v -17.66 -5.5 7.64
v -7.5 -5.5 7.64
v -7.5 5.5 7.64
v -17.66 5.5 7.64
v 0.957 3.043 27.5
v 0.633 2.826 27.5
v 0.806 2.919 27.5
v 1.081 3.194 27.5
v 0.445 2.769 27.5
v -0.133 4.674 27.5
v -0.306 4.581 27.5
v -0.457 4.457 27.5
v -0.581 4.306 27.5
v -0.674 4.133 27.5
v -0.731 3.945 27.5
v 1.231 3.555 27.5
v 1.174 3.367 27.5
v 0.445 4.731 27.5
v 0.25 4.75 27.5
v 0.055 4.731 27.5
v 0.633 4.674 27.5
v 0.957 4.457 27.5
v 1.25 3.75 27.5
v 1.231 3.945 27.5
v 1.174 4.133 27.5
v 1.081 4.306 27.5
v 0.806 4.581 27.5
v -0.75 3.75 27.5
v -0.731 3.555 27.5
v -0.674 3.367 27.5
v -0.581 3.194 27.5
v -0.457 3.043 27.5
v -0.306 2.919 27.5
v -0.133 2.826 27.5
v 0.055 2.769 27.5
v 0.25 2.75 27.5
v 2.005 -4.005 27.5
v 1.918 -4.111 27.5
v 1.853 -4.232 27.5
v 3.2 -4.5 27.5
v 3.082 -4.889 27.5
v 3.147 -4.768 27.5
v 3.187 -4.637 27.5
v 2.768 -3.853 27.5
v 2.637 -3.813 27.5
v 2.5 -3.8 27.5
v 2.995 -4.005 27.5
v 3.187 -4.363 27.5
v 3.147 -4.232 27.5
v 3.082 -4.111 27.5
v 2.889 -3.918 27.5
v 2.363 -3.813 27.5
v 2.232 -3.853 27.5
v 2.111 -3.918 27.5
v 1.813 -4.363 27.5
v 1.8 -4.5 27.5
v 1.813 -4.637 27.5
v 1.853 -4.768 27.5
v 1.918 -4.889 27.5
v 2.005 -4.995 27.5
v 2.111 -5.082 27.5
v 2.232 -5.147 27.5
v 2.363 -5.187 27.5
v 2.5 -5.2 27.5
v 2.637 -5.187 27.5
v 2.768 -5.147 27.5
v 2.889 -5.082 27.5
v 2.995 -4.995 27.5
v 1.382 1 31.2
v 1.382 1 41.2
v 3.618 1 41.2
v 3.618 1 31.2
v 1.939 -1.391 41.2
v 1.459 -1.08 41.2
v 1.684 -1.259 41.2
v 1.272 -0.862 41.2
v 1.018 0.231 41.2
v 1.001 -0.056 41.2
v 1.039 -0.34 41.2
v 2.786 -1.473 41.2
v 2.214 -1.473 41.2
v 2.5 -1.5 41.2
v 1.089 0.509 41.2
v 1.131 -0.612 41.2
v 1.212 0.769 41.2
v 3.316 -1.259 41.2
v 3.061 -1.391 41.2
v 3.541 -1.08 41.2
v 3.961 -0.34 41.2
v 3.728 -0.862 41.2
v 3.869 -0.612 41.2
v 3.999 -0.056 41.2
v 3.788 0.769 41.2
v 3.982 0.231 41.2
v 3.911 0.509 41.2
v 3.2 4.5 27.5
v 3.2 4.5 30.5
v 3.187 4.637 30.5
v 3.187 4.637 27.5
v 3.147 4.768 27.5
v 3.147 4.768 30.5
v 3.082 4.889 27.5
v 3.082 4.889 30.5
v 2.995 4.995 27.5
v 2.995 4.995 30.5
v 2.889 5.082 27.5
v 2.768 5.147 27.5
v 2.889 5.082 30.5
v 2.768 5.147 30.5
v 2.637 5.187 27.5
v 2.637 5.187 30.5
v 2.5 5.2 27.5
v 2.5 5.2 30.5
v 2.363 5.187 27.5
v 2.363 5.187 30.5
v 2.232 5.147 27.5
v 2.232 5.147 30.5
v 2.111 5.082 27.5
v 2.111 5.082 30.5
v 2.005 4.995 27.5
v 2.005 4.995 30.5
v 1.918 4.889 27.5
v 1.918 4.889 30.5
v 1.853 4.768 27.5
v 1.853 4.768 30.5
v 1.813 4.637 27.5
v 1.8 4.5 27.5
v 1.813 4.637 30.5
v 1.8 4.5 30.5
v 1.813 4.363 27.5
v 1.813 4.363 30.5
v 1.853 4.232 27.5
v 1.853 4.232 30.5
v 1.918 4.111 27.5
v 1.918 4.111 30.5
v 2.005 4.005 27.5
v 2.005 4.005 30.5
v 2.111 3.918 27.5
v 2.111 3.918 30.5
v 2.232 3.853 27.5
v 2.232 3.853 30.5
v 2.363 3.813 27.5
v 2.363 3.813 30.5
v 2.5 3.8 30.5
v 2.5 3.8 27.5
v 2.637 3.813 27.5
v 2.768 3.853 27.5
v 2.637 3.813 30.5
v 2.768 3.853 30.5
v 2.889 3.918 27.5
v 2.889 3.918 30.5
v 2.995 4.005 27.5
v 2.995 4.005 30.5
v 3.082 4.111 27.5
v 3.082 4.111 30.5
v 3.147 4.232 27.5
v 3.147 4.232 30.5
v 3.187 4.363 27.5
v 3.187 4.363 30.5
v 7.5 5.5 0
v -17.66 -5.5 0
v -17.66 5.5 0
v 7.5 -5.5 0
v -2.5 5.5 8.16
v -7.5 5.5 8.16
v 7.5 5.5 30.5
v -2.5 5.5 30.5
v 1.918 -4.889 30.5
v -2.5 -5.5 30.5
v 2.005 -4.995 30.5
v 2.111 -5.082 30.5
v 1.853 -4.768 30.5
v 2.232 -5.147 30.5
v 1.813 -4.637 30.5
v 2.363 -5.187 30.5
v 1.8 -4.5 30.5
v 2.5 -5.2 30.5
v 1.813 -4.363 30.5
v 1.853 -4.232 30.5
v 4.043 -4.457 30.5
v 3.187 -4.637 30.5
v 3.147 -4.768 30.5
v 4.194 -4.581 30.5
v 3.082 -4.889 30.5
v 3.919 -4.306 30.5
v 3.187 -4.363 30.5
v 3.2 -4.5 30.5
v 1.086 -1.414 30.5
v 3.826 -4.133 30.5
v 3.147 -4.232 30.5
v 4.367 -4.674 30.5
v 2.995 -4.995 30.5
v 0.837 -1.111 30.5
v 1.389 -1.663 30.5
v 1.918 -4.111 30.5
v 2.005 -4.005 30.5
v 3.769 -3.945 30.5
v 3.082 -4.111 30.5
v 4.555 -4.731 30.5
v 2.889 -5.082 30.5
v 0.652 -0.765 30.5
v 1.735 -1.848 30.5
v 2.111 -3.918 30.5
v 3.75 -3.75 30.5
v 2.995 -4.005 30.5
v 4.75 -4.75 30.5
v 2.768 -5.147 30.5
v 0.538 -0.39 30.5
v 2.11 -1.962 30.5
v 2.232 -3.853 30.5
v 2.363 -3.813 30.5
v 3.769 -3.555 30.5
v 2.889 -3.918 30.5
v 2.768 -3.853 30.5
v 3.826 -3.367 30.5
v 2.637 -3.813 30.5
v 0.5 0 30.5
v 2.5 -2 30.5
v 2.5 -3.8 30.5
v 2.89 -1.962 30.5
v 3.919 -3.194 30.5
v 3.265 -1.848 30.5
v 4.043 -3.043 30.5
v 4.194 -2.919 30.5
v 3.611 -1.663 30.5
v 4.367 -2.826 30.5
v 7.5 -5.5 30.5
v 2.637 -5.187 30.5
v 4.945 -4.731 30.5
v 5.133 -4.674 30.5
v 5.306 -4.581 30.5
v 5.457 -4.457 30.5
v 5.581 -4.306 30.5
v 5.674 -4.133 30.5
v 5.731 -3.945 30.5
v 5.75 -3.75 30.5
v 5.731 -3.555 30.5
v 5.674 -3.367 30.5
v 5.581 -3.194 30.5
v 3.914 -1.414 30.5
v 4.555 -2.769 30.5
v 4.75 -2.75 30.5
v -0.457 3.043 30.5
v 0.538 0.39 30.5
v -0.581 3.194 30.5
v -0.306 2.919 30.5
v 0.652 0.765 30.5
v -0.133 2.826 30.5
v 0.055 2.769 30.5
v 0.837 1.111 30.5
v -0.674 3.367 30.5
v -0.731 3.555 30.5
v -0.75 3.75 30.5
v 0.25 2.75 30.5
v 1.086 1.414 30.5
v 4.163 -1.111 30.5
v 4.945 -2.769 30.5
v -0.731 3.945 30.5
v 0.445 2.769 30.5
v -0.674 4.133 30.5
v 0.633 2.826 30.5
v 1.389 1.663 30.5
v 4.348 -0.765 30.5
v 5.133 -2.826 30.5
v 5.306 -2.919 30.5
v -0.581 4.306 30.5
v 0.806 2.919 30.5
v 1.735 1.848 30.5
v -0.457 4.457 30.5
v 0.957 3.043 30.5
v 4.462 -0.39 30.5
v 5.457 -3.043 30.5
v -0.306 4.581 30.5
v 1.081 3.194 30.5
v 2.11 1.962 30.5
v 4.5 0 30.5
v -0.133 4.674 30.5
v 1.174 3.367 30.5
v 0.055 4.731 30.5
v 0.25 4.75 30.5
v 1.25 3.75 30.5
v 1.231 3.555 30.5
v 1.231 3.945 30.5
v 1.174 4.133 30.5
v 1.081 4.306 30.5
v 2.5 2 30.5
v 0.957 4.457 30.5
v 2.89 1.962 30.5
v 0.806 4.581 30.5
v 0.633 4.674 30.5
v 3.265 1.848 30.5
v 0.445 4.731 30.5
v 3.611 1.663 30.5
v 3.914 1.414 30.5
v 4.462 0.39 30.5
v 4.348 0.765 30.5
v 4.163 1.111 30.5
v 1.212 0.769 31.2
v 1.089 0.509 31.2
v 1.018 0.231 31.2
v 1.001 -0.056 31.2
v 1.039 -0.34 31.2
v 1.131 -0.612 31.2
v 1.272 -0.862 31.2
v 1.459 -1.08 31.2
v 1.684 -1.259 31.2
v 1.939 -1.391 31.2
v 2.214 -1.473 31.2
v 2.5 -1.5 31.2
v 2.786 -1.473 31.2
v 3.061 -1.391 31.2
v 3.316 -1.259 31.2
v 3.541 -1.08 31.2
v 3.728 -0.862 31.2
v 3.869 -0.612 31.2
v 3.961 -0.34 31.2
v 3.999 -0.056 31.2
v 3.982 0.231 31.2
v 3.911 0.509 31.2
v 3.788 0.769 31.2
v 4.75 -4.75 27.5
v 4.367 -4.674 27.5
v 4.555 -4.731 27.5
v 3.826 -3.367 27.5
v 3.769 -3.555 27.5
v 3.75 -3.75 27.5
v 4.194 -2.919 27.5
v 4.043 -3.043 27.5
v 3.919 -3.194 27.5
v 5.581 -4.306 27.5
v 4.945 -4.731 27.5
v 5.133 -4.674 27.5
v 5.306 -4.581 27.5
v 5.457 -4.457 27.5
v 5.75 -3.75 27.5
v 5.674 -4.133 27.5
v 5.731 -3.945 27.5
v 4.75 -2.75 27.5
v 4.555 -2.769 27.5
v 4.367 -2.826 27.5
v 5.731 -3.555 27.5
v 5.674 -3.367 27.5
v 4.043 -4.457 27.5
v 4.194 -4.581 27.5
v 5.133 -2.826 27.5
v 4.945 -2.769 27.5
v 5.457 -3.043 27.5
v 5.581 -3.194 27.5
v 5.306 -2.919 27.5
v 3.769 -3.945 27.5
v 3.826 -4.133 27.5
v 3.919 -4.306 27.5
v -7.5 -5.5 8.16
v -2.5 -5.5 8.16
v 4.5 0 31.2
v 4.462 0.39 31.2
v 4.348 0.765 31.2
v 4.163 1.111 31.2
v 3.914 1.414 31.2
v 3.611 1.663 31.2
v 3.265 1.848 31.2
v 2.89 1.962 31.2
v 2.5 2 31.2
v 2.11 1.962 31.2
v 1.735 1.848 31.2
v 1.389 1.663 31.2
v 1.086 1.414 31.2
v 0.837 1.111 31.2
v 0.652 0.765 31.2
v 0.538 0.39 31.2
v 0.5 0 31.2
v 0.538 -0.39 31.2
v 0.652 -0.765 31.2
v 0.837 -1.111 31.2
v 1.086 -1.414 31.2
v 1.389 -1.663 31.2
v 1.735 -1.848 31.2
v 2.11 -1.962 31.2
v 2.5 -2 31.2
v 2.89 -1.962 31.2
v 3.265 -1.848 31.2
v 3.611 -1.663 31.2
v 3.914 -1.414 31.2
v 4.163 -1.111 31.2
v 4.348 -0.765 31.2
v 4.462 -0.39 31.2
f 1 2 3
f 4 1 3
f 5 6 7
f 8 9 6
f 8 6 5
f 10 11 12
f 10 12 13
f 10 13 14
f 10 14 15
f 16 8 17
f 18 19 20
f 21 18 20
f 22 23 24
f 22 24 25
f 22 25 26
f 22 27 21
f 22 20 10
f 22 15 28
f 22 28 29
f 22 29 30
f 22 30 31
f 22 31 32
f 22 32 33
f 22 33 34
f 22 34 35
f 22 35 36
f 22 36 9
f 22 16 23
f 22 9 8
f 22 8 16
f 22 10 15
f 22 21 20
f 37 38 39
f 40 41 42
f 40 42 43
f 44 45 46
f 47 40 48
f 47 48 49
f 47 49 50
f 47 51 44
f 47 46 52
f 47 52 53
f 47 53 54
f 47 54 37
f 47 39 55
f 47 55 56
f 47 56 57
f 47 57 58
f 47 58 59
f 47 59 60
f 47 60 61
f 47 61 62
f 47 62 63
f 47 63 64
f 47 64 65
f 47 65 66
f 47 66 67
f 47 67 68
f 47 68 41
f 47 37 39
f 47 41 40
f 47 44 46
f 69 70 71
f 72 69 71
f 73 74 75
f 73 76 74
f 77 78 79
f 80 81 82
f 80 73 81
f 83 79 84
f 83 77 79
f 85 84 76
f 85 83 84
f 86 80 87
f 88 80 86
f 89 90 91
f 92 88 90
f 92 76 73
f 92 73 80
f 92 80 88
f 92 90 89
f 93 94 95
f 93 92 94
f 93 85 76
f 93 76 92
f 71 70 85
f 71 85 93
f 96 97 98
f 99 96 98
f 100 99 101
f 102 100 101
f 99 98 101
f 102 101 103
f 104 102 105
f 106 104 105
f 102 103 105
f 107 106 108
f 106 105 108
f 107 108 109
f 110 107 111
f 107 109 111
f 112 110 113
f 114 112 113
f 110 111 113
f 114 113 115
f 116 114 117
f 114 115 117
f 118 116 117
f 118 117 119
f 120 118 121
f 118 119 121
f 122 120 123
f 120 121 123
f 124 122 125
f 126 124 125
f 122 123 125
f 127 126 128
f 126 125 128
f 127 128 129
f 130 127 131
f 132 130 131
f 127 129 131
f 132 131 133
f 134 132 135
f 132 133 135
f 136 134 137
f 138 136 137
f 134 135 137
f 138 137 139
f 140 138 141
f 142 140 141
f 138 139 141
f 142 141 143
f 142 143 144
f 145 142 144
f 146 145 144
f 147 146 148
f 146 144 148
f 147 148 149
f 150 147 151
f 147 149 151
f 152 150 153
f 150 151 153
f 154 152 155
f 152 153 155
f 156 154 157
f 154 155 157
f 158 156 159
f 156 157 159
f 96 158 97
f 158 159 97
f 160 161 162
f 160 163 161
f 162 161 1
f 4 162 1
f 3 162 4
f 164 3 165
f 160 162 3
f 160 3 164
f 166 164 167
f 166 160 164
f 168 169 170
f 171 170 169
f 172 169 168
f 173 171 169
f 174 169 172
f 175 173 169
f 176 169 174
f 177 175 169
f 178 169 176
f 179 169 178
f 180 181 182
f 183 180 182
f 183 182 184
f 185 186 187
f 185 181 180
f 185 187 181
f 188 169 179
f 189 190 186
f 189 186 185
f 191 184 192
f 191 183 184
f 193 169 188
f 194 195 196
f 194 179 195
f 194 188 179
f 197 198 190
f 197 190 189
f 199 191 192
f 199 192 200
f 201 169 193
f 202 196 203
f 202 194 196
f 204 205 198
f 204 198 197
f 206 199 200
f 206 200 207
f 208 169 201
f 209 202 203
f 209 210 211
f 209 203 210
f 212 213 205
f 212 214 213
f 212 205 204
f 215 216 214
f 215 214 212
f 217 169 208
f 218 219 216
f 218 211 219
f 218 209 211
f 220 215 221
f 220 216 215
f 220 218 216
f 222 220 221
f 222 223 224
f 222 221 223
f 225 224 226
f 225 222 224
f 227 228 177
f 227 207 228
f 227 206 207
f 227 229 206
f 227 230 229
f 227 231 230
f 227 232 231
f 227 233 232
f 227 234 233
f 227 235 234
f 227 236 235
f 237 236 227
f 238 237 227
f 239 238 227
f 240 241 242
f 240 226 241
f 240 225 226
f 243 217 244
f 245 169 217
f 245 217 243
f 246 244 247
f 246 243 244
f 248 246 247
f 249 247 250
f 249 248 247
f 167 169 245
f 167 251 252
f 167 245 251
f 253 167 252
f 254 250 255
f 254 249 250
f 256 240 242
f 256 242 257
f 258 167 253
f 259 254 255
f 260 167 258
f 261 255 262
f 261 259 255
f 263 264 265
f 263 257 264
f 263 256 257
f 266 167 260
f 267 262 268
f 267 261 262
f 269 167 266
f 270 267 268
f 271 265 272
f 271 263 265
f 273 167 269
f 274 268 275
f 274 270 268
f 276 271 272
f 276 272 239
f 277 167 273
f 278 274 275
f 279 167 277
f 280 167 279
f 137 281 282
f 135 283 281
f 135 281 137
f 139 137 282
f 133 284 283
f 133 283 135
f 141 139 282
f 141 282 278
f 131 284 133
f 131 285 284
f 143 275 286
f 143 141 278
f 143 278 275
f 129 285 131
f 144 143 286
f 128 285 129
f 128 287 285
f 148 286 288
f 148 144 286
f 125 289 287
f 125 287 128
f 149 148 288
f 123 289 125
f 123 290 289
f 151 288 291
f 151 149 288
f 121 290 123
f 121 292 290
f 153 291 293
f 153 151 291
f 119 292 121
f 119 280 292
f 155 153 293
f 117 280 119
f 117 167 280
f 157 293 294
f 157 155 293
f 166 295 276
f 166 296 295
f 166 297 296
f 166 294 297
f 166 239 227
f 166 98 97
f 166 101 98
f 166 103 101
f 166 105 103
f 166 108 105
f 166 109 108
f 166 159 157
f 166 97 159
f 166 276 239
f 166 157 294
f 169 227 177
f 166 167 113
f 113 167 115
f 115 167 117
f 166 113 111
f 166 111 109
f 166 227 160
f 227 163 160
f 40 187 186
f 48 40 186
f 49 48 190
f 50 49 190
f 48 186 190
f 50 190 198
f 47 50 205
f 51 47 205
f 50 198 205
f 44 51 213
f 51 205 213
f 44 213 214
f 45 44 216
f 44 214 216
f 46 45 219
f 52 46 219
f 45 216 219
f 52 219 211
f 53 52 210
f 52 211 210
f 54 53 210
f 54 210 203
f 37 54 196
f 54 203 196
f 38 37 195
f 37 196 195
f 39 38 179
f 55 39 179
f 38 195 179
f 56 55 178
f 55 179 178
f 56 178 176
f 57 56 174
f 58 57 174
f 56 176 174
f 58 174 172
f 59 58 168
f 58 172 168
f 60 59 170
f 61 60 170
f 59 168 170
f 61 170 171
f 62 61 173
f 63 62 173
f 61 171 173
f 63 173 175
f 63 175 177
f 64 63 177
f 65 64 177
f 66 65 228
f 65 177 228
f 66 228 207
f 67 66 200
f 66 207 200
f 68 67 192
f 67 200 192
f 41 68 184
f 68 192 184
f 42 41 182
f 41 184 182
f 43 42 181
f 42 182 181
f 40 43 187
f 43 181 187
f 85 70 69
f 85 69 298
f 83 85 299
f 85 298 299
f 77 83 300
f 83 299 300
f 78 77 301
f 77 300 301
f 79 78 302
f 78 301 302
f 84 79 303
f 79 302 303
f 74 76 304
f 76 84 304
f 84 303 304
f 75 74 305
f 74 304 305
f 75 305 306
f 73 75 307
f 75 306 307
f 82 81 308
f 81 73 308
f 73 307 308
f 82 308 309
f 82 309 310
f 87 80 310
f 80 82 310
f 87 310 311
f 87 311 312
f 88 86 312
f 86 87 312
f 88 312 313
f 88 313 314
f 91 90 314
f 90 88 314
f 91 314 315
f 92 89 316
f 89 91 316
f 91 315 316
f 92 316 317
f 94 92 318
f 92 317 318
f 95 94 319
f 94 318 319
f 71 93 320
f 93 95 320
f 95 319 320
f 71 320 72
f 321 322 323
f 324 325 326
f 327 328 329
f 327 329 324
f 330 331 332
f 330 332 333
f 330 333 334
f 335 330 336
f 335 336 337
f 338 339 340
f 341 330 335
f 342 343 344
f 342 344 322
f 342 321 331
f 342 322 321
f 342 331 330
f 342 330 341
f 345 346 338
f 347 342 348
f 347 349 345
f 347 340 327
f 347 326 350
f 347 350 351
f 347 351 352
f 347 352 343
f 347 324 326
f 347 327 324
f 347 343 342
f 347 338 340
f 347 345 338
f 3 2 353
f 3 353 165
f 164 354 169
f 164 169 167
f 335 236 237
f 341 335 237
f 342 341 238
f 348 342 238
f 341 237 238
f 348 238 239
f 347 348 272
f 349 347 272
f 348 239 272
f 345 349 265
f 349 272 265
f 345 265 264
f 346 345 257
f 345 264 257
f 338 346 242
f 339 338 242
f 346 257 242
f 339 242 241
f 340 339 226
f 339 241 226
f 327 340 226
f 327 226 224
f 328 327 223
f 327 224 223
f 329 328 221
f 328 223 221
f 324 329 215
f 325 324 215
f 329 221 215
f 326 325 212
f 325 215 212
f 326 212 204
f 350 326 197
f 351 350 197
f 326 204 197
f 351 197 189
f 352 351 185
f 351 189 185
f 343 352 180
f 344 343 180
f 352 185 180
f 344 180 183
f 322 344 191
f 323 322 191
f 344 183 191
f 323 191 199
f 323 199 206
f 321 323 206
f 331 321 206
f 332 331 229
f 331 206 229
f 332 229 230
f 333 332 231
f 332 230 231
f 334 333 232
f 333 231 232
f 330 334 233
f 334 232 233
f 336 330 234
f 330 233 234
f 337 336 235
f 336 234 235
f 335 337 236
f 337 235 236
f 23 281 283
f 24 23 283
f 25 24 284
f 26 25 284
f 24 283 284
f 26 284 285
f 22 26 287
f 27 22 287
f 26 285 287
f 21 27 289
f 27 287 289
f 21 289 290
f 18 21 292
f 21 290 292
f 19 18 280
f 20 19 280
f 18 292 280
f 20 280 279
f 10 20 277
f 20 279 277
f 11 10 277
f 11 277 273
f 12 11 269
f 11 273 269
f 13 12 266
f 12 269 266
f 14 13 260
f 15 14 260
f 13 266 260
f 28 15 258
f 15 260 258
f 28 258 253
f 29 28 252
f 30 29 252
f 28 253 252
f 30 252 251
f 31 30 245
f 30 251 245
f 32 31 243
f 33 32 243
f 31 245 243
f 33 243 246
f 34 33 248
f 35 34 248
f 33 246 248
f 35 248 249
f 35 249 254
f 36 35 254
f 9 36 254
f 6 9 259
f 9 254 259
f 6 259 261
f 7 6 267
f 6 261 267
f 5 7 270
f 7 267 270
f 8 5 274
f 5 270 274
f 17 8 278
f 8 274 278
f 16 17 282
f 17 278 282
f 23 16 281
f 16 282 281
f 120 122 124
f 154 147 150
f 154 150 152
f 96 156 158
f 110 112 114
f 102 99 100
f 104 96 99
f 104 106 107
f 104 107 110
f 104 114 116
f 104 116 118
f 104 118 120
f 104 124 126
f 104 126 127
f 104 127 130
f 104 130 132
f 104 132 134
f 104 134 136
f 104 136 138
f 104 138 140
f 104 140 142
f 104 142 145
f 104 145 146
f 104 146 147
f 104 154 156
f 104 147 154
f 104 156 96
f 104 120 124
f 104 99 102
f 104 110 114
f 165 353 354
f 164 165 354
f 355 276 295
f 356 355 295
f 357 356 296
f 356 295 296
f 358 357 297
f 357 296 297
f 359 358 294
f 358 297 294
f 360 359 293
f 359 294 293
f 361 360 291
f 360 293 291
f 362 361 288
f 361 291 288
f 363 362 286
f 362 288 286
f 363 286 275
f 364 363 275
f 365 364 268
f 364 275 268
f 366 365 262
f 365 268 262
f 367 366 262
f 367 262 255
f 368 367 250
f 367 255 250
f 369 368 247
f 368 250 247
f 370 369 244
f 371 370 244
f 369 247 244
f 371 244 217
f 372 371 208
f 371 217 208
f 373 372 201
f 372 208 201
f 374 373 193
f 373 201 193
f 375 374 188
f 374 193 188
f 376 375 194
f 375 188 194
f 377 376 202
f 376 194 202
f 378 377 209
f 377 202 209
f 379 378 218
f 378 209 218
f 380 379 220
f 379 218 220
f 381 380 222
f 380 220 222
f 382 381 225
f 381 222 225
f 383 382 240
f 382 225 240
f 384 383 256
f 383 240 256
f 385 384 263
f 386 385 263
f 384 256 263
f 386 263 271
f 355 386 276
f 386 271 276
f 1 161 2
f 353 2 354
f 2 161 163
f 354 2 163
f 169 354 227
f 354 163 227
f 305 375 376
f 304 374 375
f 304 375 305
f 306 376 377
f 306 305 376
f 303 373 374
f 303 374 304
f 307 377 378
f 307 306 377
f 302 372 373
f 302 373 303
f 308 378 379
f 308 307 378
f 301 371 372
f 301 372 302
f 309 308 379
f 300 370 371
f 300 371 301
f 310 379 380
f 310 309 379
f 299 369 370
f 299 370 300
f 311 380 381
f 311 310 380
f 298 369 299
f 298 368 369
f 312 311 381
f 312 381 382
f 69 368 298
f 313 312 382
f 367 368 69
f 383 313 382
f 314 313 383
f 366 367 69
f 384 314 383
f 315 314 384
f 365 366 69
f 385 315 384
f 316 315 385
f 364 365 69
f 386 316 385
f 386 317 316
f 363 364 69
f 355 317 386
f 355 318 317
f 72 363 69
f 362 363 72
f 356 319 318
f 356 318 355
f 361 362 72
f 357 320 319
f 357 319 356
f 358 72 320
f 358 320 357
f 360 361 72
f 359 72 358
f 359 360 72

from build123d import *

# Parameters (mm, degrees)
SKETCH1_W           = 15
SKETCH1_H           = 11
BOSS_EXTRUDE1_DEPTH = 21.5
SKETCH2_W           = 10
SKETCH2_H           = 11
BOSS_EXTRUDE2_DEPTH = 9
SKETCH3_R           = 2
BOSS_EXTRUDE3_DEPTH = 0.7
SKETCH4_R           = 1.5
BOSS_EXTRUDE4_DEPTH = 10
CUT_EXTRUDE1_DEPTH  = 10
SKETCH6_R           = 0.7
SKETCH6_R_2         = 1
CUT_EXTRUDE2_DEPTH  = 3
SKETCH7_W           = 7.64
SKETCH7_H           = 11
BOSS_EXTRUDE5_DEPTH = 10.16
SKETCH8_W           = 5
SKETCH8_H           = 13.3399974
CUT_EXTRUDE3_DEPTH  = 11


with BuildPart() as part:
    # Sketch1 → Boss-Extrude1 (new body)
    with BuildSketch(Plane.XY):
        Rectangle(SKETCH1_W, SKETCH1_H)
    extrude(amount=BOSS_EXTRUDE1_DEPTH)

    # Sketch2 → Boss-Extrude2 (add)
    with BuildSketch(Plane.XY.offset(21.5)):
        with Locations((2.5, 0)):
            Rectangle(SKETCH2_W, SKETCH2_H)
    extrude(amount=BOSS_EXTRUDE2_DEPTH)

    # Sketch3 → Boss-Extrude3 (add)
    with BuildSketch(Plane.XY.offset(30.5)):
        with Locations((2.5, 0)):
            Circle(SKETCH3_R)
    extrude(amount=BOSS_EXTRUDE3_DEPTH)

    # Sketch4 → Boss-Extrude4 (add)
    with BuildSketch(Plane.XY.offset(31.2)):
        with Locations((2.5, 0)):
            Circle(SKETCH4_R)
    extrude(amount=BOSS_EXTRUDE4_DEPTH)

    # Sketch5 → Cut-Extrude1 (cut)
    with BuildSketch(Plane.XY.offset(41.2)):
        with BuildLine():
            Line((1.381966011, 1), (3.618033989, 1))
            ThreePointArc((3.618033989, 1), (2.5, 1.5), (1.381966011, 1))
        make_face()
    extrude(amount=-CUT_EXTRUDE1_DEPTH, mode=Mode.SUBTRACT)

    # Sketch6 → Cut-Extrude2 (cut)
    with BuildSketch(Plane.XY.offset(30.5)):
        with Locations((2.5, 4.5)):
            Circle(SKETCH6_R)
        with Locations((2.5, -4.5)):
            Circle(SKETCH6_R)
        with Locations((4.75, -3.75)):
            Circle(SKETCH6_R_2)
        with Locations((0.25, 3.75)):
            Circle(SKETCH6_R_2)
    extrude(amount=-CUT_EXTRUDE2_DEPTH, mode=Mode.SUBTRACT)

    # Sketch7 → Boss-Extrude5 (add)
    with BuildSketch(Plane.ZY.offset(7.5)):
        with Locations((3.82, 0)):
            Rectangle(SKETCH7_W, SKETCH7_H)
    extrude(amount=BOSS_EXTRUDE5_DEPTH)

    # Sketch8 → Cut-Extrude3 (cut)
    with BuildSketch(Plane.XZ.offset(5.5)):
        with Locations((-5, 14.8300013)):
            Rectangle(SKETCH8_W, SKETCH8_H)
    extrude(amount=-CUT_EXTRUDE3_DEPTH, mode=Mode.SUBTRACT)


solid = part.part
